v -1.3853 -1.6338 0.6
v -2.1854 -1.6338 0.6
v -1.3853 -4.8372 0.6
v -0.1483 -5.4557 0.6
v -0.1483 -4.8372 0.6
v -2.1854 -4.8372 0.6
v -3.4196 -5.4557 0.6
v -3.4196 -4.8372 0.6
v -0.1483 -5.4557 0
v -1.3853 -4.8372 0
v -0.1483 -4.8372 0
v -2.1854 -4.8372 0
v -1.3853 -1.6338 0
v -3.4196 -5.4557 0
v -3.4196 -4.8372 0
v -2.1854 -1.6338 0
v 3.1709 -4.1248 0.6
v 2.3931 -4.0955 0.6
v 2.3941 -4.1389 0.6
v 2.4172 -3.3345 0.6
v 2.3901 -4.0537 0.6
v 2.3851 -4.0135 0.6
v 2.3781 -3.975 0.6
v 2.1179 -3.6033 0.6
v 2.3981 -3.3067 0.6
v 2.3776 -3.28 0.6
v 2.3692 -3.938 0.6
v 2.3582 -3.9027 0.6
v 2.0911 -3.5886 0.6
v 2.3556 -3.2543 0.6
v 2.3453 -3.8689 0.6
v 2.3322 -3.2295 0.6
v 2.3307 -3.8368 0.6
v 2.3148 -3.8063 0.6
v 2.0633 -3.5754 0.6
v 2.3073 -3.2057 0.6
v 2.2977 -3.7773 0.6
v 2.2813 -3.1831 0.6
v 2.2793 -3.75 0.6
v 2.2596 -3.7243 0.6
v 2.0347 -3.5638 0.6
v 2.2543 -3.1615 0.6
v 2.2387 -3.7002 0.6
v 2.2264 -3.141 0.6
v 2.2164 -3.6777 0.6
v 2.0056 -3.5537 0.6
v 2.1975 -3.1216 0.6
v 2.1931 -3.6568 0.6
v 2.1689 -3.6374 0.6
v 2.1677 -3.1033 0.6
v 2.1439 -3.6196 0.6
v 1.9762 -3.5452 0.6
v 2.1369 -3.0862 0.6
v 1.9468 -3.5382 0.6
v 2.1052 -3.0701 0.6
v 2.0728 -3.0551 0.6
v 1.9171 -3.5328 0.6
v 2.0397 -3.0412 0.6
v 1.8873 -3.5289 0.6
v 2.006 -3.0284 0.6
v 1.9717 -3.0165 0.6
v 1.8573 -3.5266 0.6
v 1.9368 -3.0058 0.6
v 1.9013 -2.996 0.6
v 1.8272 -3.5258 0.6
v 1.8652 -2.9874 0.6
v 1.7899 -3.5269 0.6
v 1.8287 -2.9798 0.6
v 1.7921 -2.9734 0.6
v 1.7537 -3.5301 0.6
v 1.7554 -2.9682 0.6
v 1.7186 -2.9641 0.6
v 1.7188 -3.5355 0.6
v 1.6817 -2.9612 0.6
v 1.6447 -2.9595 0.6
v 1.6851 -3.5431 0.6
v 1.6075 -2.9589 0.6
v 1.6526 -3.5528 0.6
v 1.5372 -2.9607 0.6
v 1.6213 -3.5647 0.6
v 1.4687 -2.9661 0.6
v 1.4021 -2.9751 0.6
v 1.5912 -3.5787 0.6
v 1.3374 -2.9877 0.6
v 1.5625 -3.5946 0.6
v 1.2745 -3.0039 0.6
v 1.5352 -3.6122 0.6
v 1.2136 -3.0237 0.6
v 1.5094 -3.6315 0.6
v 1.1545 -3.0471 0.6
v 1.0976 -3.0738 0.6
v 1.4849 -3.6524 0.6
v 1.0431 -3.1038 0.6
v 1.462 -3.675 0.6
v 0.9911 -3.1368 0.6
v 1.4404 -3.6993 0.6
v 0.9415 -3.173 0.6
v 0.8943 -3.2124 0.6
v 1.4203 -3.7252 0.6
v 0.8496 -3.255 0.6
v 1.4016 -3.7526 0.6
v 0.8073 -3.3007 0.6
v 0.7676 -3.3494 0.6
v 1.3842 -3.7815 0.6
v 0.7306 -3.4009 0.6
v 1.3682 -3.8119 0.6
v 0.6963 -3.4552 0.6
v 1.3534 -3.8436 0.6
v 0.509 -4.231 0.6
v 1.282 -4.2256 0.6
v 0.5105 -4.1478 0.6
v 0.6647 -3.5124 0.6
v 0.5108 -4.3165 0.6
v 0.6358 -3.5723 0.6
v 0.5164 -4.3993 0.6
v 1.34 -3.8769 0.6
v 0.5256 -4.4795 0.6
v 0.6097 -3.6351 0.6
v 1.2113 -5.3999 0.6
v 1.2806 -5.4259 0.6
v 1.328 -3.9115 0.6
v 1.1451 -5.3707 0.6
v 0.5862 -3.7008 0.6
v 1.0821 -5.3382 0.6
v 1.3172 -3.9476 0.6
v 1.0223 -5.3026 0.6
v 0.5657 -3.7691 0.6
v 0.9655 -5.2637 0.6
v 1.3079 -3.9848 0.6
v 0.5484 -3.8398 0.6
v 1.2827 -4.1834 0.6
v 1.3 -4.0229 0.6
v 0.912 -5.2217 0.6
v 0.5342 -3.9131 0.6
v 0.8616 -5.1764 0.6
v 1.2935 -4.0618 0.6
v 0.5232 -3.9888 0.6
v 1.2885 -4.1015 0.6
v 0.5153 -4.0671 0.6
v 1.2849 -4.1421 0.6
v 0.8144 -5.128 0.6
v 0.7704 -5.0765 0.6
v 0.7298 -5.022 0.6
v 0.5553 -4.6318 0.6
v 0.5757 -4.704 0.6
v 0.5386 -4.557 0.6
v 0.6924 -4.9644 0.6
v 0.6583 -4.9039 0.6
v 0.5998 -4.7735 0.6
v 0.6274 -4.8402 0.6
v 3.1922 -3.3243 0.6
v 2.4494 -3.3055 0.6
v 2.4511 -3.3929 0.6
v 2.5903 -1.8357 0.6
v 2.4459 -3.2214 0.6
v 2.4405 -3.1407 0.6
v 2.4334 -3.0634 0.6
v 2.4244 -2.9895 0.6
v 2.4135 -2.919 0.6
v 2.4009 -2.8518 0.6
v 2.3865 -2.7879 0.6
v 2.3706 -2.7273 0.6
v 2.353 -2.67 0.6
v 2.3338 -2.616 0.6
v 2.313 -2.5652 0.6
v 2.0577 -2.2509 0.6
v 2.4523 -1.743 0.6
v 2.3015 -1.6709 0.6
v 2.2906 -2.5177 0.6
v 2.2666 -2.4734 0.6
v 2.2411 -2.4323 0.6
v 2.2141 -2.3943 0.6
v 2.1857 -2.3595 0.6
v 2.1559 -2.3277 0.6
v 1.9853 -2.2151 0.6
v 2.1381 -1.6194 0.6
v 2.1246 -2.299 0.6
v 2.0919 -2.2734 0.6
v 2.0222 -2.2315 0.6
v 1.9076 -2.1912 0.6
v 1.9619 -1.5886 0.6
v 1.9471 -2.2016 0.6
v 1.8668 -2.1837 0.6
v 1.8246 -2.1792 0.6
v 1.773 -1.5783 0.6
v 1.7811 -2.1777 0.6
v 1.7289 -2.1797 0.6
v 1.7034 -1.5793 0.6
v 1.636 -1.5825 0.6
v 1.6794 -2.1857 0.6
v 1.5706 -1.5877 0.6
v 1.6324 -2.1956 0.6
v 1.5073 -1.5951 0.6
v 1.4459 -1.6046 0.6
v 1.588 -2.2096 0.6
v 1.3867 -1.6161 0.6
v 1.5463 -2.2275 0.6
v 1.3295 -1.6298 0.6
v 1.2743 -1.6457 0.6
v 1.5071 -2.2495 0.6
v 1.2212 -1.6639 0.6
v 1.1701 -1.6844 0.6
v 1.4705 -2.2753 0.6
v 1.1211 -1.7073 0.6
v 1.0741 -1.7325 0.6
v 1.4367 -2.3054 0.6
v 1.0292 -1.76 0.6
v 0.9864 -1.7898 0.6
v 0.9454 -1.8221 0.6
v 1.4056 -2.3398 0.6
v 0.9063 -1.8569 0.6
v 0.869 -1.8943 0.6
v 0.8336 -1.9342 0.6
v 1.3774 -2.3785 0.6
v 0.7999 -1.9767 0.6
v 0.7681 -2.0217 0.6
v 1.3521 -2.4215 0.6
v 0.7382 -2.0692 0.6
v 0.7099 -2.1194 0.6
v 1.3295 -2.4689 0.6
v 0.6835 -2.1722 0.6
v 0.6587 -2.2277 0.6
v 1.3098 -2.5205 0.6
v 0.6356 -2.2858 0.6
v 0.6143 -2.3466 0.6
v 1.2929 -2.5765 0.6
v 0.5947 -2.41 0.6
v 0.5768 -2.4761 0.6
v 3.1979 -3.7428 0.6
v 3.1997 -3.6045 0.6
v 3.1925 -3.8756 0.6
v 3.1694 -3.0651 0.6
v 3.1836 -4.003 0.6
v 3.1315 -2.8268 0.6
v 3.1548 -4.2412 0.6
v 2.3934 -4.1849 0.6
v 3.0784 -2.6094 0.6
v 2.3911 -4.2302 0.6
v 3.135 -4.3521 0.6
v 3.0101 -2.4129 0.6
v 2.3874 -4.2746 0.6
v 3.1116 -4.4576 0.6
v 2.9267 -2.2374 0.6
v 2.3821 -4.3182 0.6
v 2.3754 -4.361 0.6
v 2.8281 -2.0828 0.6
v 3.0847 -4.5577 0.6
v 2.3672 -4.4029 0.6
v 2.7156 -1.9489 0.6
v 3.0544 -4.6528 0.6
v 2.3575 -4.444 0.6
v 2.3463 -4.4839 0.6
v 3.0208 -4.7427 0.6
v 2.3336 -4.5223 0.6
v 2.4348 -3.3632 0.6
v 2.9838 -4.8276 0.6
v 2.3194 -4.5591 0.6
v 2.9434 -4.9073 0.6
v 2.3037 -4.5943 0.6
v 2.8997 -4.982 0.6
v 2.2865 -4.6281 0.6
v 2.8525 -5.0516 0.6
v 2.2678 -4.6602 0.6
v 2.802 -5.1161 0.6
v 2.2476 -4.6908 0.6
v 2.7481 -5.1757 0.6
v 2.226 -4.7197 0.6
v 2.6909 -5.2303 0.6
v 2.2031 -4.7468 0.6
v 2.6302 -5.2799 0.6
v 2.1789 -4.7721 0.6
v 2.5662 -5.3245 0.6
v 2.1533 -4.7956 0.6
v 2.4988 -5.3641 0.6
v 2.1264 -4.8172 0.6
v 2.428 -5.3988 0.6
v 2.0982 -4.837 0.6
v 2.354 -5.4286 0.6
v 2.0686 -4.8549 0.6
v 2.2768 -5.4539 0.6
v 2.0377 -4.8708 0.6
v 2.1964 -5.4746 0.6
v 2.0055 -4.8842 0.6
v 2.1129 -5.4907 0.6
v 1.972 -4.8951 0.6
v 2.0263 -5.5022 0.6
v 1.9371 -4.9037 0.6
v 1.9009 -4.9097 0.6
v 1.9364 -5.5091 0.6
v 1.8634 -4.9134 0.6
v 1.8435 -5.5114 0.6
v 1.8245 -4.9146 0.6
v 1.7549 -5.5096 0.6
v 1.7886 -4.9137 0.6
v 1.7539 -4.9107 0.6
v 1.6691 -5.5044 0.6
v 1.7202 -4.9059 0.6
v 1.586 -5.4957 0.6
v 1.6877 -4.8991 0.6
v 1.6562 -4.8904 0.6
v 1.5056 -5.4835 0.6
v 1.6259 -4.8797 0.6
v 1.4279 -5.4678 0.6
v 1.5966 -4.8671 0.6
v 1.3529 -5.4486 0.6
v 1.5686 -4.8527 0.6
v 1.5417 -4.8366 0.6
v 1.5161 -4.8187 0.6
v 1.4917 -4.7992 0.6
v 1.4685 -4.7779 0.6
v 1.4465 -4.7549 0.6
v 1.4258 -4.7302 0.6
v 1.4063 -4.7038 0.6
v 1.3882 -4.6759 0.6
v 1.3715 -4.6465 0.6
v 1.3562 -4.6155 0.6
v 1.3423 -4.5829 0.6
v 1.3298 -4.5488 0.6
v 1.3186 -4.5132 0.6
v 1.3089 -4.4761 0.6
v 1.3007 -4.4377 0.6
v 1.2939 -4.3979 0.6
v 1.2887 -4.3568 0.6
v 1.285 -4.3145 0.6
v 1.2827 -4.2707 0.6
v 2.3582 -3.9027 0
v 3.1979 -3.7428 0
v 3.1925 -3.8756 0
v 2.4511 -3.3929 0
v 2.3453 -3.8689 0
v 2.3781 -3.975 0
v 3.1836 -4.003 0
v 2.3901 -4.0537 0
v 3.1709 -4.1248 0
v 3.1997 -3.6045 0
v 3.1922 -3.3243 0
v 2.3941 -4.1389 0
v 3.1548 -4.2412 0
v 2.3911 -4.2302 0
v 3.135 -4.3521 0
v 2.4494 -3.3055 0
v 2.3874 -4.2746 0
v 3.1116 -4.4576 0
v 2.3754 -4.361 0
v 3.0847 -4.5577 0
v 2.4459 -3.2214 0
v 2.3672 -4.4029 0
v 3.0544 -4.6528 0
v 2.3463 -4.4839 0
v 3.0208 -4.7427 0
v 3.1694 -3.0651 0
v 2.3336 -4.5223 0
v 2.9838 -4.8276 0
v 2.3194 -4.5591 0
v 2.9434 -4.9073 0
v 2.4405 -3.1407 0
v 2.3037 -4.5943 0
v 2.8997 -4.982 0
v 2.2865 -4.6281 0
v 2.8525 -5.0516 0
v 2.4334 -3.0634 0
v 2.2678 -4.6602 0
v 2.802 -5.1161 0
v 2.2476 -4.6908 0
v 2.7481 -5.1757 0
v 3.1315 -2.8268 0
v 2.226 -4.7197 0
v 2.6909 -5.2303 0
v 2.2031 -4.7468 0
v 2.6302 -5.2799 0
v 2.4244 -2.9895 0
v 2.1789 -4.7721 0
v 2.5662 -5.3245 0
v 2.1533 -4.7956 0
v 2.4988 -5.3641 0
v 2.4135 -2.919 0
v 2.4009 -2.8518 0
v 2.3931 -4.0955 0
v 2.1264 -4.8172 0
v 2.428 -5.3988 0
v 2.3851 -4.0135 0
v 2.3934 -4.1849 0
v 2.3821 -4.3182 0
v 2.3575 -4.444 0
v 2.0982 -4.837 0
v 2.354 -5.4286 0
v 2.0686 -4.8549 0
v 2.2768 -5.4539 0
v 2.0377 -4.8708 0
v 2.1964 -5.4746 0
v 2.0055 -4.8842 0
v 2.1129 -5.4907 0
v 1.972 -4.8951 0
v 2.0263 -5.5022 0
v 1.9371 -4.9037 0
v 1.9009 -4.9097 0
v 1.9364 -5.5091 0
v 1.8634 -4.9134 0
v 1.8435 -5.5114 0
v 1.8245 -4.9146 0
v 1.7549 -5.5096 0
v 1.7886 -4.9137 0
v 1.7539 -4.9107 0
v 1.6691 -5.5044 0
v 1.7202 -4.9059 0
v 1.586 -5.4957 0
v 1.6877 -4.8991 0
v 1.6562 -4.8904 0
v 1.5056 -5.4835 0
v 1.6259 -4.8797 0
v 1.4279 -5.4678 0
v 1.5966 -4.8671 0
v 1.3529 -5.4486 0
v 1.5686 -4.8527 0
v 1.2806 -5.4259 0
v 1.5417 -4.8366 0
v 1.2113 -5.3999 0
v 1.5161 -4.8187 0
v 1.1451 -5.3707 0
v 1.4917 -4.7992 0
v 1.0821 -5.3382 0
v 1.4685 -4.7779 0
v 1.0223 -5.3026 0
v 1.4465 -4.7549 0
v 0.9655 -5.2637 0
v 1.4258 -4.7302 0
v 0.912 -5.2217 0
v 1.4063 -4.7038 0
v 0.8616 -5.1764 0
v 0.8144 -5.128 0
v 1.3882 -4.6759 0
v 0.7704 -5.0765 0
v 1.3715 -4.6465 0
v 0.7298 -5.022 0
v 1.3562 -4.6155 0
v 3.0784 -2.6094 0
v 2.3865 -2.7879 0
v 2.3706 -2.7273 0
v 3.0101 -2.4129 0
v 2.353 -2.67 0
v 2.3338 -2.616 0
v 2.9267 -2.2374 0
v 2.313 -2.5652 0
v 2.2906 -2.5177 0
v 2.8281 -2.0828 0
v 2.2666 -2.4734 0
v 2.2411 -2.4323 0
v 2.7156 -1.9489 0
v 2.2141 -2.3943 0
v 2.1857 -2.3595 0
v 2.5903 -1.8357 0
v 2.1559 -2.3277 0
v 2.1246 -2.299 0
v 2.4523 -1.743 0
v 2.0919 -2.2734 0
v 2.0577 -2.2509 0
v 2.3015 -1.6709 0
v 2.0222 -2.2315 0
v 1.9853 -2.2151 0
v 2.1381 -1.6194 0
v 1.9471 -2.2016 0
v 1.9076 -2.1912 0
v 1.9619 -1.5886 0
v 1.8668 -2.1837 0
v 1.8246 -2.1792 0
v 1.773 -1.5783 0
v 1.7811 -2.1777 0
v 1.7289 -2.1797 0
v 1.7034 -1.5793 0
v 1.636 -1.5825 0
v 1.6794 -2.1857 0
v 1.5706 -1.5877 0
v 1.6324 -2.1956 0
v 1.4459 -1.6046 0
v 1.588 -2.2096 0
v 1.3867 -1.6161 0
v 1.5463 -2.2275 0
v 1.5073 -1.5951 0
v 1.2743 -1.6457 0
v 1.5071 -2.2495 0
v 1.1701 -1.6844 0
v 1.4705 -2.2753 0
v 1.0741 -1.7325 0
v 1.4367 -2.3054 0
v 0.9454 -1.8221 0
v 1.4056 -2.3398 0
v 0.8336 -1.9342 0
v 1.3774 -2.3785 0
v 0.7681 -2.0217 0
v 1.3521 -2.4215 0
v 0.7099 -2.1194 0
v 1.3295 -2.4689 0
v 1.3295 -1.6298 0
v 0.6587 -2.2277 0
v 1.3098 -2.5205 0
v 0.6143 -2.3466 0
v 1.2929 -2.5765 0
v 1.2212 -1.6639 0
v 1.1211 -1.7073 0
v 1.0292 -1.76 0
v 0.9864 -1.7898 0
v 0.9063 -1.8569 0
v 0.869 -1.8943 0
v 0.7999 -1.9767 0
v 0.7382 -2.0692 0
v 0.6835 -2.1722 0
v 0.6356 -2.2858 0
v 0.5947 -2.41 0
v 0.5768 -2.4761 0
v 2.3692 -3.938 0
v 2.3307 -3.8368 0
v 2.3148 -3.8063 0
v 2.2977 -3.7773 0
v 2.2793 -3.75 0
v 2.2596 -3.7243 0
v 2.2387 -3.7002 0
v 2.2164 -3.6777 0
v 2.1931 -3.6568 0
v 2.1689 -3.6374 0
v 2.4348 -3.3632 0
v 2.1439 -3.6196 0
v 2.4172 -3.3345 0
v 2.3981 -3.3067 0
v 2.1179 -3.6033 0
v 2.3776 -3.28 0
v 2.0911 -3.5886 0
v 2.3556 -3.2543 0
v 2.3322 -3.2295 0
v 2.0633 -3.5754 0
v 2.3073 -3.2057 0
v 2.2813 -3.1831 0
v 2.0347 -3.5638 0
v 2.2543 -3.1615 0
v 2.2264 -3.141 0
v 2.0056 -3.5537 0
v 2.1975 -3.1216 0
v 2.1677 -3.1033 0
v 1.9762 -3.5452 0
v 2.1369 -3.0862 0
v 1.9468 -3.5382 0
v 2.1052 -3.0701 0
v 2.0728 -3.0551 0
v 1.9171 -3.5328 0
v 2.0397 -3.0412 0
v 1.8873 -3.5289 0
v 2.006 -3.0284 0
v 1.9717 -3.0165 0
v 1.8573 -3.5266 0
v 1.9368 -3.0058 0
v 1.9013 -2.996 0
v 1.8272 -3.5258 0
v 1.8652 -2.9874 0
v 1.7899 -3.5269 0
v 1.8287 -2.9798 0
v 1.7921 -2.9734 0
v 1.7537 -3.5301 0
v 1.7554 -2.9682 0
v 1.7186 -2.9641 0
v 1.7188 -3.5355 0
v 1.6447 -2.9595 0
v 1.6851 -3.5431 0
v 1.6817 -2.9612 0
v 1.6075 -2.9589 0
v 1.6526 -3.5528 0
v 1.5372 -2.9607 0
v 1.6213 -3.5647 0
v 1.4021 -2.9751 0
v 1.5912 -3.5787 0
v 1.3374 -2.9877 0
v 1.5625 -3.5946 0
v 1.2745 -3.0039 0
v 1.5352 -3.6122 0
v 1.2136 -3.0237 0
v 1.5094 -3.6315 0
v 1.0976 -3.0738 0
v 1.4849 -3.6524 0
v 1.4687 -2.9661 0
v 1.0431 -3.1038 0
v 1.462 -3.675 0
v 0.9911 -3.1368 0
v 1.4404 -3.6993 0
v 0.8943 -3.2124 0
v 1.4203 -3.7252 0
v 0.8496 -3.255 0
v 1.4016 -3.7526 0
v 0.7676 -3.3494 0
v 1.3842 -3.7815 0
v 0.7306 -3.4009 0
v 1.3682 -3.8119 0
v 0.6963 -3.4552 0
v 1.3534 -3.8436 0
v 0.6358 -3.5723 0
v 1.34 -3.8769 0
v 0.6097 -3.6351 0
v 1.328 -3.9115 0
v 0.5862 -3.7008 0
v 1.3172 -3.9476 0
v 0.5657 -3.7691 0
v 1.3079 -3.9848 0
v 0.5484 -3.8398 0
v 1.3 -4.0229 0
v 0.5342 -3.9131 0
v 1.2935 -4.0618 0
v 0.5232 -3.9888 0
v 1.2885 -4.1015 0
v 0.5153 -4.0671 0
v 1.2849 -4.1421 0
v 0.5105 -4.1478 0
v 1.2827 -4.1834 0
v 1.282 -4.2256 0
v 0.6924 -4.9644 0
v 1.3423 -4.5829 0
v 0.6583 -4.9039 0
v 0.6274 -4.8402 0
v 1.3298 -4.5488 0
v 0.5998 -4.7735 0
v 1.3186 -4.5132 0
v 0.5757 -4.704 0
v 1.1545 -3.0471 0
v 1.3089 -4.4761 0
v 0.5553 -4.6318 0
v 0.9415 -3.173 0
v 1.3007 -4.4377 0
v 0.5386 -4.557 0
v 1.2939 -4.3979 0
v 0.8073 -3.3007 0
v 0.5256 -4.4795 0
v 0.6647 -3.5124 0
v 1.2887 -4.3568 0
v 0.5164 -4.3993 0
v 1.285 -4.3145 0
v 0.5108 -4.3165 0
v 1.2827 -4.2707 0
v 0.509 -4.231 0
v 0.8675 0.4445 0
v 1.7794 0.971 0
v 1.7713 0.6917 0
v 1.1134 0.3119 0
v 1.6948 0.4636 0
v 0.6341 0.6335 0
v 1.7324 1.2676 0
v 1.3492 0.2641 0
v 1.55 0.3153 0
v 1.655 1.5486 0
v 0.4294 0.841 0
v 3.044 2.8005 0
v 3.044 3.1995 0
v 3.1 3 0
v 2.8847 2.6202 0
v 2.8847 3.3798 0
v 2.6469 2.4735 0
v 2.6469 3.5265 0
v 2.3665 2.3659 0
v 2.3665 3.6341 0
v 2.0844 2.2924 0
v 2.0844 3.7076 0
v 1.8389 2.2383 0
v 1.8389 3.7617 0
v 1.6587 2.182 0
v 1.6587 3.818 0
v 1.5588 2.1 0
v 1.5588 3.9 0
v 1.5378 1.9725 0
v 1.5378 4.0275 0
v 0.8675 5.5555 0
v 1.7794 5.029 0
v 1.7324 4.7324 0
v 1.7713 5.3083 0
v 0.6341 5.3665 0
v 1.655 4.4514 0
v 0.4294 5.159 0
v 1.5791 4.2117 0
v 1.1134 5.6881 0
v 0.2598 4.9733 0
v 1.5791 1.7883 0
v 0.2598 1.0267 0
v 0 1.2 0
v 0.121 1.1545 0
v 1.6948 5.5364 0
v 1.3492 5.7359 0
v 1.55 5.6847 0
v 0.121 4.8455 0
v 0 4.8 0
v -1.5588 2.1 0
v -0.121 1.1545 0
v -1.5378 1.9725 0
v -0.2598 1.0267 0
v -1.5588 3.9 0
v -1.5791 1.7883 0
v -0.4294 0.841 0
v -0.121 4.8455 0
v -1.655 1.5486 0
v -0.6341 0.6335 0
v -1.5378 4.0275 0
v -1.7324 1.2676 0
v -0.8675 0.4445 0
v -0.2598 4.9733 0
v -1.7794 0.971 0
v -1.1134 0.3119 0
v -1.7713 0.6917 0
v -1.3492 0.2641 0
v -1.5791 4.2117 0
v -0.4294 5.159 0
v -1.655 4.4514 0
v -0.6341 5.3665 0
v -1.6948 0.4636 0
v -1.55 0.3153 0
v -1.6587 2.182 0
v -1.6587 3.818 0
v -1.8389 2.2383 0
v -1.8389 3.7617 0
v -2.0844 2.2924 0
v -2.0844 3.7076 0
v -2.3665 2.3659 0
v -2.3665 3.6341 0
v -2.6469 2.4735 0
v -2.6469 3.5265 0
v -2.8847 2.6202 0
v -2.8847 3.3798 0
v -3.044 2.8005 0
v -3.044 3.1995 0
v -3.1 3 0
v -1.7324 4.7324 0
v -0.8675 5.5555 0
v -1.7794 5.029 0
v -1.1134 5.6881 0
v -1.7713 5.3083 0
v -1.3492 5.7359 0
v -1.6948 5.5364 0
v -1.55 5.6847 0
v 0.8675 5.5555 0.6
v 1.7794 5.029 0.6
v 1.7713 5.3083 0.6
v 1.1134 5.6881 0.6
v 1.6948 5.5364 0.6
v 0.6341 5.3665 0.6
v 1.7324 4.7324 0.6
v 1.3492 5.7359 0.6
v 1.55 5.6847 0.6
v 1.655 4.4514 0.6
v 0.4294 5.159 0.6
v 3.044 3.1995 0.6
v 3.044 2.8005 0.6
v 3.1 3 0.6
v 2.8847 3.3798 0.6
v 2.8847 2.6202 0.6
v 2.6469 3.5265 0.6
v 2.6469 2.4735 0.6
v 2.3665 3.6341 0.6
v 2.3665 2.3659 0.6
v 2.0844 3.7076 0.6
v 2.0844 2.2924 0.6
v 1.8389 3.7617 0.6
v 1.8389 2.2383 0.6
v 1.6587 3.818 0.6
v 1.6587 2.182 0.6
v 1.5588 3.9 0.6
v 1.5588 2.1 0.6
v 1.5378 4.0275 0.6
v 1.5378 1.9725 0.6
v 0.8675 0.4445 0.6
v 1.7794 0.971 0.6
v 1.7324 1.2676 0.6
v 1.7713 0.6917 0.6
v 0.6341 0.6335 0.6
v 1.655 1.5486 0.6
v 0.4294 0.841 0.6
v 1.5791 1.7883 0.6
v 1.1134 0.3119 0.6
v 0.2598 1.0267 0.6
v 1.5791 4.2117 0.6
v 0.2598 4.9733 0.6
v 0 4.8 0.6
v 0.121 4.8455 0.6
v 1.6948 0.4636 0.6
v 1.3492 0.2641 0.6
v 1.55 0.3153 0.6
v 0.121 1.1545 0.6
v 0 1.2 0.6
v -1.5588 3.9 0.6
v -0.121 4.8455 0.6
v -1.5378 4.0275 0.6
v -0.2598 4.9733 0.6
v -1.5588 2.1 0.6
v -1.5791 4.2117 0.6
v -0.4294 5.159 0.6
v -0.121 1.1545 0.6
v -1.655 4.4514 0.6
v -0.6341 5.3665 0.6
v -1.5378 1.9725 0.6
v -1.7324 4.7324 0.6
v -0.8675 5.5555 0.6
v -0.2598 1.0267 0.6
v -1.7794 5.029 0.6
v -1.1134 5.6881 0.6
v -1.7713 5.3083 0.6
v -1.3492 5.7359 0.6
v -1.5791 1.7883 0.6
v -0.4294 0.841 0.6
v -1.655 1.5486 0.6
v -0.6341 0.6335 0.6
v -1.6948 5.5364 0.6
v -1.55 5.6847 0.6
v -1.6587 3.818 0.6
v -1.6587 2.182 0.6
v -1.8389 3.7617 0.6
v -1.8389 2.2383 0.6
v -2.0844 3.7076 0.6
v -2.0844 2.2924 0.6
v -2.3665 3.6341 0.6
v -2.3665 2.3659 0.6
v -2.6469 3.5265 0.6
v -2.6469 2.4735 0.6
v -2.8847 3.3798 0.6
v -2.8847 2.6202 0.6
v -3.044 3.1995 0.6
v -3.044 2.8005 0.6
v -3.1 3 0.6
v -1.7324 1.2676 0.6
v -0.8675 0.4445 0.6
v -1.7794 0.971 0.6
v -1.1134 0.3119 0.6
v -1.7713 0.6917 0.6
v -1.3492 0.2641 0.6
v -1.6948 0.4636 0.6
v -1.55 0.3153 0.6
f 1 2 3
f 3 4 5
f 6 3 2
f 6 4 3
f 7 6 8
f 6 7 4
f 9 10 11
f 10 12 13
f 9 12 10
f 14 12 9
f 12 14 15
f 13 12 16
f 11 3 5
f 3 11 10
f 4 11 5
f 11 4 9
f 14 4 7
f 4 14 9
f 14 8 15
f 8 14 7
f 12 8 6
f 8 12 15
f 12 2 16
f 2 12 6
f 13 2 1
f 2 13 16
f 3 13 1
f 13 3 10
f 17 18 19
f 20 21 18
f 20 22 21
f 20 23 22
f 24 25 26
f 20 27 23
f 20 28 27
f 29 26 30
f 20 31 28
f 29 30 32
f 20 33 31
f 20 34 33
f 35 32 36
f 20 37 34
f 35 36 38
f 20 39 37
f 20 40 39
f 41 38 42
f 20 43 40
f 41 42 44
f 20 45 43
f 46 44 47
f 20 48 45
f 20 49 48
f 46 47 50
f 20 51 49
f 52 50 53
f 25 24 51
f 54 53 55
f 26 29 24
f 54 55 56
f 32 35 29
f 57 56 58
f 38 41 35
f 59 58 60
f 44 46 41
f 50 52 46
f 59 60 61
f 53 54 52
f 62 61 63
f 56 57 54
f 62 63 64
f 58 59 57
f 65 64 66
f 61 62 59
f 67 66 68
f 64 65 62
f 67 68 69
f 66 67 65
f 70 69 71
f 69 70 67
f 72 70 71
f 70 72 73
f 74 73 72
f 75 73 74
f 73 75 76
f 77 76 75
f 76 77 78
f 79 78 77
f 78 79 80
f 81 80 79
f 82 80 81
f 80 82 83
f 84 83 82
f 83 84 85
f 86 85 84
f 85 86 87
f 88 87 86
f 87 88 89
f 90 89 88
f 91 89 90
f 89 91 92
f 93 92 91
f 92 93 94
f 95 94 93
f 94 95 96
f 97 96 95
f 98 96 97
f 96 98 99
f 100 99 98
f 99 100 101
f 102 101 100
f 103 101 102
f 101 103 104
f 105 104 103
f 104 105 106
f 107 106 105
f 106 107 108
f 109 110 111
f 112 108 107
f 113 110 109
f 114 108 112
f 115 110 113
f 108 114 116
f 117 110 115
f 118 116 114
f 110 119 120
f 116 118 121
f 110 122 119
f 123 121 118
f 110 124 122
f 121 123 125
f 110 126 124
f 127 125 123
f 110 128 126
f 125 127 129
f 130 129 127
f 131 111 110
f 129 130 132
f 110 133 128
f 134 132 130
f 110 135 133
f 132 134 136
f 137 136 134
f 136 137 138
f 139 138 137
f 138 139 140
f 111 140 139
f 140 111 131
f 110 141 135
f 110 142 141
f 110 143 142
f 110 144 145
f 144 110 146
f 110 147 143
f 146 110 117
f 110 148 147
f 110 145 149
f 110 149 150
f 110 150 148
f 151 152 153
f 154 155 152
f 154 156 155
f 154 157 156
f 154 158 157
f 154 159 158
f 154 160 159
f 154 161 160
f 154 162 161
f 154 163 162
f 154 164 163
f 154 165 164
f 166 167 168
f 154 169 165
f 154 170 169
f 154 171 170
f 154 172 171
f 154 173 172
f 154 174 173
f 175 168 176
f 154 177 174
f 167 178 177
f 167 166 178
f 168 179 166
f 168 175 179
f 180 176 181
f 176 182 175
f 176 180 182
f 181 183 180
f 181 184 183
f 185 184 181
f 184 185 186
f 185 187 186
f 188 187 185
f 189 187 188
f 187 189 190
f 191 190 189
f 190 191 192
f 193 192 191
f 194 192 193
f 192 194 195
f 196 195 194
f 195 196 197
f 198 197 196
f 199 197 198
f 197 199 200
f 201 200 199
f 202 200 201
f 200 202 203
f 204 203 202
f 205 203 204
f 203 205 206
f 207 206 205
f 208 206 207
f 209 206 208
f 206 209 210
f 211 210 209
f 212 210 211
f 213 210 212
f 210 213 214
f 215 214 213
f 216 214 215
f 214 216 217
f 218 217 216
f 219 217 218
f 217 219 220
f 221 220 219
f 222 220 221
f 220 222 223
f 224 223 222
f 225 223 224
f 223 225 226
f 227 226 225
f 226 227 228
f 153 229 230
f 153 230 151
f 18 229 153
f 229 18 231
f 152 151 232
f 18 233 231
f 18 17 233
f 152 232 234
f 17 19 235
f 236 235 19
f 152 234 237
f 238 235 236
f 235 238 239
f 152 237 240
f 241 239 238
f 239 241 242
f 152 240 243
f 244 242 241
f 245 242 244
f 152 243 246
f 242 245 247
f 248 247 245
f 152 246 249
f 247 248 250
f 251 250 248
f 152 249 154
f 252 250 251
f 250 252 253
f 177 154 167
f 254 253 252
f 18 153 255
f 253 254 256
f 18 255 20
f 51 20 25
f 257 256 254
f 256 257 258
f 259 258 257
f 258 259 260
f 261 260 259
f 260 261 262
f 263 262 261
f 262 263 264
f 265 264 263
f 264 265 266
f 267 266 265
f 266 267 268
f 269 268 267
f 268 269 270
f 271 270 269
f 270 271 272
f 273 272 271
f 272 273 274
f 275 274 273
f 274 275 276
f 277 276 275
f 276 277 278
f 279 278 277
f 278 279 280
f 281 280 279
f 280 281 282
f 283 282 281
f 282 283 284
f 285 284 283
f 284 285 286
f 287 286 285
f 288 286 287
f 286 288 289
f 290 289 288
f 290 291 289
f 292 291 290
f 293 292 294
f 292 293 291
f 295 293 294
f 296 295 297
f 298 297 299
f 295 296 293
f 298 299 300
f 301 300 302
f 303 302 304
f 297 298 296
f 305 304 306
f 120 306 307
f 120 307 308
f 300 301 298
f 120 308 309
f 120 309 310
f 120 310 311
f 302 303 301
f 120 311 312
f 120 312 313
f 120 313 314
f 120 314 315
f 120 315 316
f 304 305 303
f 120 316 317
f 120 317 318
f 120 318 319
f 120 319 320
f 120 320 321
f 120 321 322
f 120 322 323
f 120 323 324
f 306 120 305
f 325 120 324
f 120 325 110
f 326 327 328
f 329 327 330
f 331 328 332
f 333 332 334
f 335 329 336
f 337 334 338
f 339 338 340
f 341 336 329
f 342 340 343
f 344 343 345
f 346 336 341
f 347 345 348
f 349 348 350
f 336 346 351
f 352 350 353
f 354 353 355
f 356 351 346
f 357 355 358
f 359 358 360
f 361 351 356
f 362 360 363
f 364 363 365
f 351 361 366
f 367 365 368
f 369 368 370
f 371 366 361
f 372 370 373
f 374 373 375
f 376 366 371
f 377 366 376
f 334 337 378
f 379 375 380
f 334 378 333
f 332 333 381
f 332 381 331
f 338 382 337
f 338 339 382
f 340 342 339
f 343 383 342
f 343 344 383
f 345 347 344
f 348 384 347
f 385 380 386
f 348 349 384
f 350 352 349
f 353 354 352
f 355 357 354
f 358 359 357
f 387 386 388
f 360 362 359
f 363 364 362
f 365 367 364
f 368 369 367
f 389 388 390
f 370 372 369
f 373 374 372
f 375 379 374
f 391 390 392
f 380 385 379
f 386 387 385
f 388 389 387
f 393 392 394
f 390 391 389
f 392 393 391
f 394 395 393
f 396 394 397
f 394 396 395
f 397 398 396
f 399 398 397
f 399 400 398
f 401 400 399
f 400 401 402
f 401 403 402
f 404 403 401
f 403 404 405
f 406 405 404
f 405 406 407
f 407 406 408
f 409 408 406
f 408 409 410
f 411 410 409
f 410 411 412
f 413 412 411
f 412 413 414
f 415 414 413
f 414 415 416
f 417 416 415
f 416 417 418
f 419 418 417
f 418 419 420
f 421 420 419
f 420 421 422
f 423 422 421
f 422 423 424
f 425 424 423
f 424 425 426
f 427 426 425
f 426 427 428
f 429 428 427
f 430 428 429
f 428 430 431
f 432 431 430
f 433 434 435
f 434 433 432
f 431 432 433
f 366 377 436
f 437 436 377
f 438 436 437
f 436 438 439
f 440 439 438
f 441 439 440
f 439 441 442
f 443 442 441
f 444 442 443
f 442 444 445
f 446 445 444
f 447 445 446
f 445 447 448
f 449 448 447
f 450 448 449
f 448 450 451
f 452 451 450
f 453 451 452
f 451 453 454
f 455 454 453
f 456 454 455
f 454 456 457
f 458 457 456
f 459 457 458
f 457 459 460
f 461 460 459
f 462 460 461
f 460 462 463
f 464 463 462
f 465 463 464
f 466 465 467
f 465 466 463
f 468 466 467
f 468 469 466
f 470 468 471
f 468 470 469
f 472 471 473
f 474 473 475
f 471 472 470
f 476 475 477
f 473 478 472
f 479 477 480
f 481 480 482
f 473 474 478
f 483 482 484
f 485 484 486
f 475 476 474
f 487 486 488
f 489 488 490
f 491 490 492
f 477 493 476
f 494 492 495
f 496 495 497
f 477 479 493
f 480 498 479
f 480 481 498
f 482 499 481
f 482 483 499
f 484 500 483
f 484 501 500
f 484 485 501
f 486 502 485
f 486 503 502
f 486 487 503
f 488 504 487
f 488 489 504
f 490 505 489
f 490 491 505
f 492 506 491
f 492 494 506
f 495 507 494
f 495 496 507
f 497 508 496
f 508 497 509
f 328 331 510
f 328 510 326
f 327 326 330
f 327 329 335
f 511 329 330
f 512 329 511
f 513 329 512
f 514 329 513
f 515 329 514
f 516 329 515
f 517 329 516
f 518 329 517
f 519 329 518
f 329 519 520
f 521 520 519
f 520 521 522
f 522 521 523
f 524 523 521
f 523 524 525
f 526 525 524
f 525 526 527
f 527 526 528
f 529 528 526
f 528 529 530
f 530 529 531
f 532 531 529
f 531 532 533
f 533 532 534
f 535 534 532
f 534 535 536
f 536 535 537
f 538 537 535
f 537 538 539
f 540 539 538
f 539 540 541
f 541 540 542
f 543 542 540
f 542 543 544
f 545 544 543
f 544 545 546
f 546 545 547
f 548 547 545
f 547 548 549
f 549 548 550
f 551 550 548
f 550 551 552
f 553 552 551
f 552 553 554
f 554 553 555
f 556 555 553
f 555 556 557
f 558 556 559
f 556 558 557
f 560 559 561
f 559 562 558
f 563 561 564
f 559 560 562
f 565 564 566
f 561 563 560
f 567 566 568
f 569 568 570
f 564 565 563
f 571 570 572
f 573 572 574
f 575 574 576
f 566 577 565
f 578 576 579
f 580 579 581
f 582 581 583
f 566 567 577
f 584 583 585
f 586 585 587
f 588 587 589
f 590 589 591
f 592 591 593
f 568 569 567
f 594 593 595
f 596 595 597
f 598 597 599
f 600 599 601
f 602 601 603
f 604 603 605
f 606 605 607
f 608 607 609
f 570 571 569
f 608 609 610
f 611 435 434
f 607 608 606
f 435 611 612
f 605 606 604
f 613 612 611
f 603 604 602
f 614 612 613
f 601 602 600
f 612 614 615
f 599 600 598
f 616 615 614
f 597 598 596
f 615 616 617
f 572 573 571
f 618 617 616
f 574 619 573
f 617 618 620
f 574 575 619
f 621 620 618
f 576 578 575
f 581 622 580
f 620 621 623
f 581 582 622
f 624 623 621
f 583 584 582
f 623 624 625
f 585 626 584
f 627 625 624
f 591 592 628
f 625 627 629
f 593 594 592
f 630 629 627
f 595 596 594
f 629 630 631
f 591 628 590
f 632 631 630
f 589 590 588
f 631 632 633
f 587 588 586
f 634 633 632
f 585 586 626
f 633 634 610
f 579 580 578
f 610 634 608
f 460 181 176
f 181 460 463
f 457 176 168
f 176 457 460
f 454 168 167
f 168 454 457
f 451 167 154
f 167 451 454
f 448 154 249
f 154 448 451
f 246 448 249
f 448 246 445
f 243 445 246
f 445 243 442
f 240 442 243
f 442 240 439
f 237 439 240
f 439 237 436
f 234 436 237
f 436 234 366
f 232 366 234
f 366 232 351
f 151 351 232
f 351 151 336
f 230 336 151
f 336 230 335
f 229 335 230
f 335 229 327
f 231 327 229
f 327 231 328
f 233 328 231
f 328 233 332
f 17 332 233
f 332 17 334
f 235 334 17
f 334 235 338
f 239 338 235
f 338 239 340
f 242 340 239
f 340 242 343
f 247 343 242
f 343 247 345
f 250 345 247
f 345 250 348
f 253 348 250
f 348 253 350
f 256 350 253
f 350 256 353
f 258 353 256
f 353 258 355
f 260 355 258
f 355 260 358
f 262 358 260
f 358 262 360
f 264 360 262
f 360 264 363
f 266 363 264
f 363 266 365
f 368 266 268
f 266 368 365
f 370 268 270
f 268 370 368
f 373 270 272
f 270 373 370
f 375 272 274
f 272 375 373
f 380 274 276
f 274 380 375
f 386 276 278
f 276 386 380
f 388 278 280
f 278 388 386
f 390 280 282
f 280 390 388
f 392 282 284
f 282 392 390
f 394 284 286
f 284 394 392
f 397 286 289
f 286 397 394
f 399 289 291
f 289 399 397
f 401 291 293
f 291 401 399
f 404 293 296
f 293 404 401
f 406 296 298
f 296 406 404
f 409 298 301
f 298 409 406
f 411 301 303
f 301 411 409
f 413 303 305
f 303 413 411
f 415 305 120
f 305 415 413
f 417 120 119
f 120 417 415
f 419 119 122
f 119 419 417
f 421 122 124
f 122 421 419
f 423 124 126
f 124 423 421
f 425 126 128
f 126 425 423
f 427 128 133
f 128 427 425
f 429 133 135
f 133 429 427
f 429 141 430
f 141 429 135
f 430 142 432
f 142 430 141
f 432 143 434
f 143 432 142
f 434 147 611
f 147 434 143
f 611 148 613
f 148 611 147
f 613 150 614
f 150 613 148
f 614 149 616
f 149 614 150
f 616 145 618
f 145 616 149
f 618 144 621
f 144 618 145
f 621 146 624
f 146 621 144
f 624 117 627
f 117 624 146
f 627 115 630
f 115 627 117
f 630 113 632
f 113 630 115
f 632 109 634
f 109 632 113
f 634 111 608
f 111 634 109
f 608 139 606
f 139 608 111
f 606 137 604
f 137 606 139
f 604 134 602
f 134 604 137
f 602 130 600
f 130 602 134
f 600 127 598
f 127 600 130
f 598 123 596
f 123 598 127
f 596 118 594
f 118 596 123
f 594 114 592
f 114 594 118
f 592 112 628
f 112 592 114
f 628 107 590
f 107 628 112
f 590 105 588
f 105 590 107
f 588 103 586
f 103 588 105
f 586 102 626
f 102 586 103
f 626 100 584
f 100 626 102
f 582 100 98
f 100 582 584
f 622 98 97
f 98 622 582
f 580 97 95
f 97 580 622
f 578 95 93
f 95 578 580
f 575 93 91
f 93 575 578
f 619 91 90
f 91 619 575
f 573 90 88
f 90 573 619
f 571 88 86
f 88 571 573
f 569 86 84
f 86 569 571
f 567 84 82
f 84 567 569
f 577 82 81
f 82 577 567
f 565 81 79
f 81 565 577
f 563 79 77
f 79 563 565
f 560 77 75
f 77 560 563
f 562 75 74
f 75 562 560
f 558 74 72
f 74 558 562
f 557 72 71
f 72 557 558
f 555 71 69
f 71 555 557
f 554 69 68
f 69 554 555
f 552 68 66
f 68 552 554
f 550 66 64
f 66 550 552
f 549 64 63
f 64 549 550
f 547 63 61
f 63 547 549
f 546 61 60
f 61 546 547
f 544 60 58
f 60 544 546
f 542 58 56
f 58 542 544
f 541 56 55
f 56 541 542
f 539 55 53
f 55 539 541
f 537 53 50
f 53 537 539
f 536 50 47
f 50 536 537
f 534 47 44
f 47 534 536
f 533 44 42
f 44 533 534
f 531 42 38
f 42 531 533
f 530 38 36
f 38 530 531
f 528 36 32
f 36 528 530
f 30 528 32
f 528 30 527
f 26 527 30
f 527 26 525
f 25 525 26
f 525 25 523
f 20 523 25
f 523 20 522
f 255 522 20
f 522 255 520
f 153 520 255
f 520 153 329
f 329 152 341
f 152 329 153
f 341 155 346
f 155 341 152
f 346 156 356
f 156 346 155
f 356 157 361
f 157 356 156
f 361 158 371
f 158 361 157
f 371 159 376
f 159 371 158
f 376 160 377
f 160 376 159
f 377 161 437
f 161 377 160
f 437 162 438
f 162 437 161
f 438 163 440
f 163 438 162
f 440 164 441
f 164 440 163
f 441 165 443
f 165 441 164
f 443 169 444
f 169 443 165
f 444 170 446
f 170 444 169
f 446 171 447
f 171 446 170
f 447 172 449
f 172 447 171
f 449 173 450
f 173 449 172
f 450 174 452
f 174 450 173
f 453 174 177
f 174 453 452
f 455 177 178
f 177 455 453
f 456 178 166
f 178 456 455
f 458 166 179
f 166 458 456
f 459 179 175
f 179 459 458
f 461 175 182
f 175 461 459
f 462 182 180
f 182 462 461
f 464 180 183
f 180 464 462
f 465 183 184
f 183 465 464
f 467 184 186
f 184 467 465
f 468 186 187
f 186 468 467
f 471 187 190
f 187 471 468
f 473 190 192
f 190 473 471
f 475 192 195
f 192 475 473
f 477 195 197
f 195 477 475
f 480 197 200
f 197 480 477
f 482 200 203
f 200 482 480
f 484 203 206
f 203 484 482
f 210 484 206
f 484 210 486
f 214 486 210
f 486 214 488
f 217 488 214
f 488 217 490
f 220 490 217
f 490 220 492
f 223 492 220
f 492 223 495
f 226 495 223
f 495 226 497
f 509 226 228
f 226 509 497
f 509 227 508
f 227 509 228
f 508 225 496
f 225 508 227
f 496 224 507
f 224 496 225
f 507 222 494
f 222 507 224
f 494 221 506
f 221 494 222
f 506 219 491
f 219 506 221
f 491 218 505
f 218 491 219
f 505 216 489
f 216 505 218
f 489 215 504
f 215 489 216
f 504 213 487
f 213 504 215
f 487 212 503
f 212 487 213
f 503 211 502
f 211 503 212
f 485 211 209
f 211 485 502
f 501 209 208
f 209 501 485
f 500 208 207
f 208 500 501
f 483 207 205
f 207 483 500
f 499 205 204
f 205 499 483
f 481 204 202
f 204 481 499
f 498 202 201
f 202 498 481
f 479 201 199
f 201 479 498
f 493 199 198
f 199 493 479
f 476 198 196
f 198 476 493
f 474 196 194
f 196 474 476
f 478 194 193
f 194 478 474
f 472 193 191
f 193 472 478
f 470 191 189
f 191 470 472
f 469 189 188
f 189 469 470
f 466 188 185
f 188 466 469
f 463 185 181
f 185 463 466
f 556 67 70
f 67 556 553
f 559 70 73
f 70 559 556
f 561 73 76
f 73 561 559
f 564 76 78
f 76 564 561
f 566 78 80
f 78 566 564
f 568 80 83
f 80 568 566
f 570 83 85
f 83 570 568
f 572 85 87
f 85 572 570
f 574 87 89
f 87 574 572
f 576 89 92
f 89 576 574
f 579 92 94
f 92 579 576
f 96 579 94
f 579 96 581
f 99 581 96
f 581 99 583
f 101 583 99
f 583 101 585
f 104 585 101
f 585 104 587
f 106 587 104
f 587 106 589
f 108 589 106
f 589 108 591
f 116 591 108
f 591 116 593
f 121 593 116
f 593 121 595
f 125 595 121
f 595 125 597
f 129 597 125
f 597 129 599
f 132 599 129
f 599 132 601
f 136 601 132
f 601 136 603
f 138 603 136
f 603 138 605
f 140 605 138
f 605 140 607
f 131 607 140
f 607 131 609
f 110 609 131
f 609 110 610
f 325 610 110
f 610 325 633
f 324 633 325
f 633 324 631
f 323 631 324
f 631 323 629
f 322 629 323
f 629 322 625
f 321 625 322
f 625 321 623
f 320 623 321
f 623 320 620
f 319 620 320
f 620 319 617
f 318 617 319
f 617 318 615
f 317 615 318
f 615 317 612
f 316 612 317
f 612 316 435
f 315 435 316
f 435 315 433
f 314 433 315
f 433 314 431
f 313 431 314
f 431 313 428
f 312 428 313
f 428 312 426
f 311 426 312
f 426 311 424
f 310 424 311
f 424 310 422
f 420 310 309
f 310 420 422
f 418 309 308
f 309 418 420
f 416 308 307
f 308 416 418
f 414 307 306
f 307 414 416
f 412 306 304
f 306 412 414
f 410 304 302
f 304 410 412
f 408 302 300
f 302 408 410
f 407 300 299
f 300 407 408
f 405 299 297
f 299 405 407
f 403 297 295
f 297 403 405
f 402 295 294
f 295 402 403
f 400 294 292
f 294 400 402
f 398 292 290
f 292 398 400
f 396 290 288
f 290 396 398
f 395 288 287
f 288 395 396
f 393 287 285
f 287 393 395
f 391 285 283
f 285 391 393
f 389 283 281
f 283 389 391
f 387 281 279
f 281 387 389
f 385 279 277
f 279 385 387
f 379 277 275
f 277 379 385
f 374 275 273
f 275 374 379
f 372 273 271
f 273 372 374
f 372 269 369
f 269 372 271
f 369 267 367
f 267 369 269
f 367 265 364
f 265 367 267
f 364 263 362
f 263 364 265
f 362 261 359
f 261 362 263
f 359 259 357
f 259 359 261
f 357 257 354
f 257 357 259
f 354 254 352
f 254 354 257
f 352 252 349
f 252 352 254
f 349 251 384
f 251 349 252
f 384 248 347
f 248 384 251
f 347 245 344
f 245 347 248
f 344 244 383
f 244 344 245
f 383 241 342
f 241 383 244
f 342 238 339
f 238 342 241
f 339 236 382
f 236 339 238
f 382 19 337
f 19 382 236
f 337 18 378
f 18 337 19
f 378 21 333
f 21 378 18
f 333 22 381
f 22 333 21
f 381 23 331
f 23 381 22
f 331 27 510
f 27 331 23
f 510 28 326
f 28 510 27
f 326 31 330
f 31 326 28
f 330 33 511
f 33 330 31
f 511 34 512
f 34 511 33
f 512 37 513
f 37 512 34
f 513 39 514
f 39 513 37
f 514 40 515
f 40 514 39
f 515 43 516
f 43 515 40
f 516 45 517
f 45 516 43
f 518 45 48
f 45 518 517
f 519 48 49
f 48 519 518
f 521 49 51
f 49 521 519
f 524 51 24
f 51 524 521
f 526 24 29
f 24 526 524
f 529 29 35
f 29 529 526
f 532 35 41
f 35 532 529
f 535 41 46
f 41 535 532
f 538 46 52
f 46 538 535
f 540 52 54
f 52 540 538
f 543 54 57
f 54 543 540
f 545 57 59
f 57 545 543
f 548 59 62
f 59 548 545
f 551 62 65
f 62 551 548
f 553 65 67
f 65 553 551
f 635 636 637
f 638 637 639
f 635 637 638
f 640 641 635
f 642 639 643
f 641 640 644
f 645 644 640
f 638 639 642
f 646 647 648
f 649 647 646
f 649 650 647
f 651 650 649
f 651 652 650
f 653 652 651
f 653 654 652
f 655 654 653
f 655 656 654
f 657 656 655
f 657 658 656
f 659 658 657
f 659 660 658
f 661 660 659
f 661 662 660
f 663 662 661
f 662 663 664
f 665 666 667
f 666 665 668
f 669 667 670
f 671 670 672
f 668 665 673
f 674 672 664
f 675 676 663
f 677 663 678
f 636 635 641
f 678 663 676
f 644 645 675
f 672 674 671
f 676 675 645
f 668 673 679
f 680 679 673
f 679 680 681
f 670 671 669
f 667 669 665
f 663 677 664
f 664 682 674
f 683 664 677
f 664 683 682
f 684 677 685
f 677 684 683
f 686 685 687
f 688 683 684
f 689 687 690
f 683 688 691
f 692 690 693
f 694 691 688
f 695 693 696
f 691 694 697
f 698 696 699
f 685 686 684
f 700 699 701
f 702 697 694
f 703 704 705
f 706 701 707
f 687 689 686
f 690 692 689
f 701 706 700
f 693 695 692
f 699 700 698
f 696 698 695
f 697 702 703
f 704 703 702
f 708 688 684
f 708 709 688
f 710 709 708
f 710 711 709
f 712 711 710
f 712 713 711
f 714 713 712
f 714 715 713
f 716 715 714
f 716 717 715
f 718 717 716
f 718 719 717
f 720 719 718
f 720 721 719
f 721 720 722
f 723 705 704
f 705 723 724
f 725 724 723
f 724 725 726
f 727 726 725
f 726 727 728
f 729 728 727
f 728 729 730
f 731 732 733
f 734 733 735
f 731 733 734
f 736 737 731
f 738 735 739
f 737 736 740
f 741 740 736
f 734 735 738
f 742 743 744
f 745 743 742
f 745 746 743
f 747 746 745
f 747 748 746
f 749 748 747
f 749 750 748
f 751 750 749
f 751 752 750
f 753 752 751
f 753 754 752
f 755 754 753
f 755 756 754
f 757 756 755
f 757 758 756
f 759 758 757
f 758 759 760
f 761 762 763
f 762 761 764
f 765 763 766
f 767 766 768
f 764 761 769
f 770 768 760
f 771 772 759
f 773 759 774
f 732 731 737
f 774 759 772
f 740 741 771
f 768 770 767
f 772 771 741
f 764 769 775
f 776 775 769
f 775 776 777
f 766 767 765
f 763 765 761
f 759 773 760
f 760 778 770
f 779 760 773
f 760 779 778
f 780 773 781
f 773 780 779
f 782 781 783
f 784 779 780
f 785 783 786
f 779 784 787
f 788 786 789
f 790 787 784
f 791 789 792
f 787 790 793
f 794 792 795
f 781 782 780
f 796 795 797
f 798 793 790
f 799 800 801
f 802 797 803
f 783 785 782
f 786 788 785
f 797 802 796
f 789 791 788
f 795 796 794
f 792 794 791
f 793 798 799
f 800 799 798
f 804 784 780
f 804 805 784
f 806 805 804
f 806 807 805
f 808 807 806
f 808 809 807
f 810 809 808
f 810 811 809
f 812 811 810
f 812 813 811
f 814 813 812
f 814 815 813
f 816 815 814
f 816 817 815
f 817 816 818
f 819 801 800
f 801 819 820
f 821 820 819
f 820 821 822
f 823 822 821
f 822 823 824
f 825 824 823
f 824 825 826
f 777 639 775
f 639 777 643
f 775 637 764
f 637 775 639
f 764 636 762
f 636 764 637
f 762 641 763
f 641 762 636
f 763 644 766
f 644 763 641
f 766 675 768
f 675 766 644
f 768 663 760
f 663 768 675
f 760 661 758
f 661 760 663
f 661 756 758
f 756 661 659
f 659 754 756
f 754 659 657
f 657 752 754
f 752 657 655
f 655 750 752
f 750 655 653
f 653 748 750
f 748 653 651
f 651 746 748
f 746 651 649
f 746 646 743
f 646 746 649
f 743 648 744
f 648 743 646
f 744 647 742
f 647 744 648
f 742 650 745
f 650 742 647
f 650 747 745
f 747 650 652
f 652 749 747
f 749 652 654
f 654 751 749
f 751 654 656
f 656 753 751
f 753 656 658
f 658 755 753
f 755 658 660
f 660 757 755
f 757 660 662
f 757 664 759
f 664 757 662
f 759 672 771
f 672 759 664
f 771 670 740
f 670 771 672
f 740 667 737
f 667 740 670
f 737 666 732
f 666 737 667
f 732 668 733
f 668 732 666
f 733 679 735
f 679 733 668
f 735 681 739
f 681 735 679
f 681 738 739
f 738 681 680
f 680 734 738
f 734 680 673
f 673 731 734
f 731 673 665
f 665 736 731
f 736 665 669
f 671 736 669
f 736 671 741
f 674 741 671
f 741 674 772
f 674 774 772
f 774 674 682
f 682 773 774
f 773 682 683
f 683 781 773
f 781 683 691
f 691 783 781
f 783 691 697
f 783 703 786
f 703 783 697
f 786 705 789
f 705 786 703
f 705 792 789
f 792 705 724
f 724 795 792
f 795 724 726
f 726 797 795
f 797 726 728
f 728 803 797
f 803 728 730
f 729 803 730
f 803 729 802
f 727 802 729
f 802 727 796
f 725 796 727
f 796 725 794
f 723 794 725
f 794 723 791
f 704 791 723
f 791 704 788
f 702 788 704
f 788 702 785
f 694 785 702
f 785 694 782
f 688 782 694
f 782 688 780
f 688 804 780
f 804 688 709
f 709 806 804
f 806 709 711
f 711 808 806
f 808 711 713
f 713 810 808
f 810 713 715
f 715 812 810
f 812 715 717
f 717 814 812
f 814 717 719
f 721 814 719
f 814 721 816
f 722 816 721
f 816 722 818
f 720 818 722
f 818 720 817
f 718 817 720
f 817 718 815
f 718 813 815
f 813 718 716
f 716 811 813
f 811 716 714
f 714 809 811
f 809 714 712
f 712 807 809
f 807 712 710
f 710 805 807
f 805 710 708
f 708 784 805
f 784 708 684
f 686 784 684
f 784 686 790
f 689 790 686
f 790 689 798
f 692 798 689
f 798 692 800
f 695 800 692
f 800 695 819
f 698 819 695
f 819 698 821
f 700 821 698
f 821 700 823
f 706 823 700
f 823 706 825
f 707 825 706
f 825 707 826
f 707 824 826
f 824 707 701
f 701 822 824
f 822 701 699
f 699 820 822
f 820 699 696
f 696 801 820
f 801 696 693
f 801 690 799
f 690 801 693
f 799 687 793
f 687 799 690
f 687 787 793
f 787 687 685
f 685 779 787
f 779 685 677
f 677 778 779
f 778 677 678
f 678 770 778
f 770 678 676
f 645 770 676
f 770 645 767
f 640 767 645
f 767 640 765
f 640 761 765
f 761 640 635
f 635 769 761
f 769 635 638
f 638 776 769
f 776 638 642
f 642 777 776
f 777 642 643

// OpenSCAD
$fn = 50;

difference() {
	union() {
		translate(v = [-1.825, -3.5, 0.6]) {
			rotate(a = [180, 0, 0]) {
				linear_extrude(height = 0.6) {
					text(font = "Liberation Sans:style=Bold", halign = "center", size = 4.0, text = "T", valign = "center");
				}
			}
		}
		translate(v = [1.825, -3.5, 0.6]) {
			rotate(a = [180, 0, 0]) {
				linear_extrude(height = 0.6) {
					text(font = "Liberation Sans:style=Bold", halign = "center", size = 4.0, text = "9", valign = "center");
				}
			}
		}
		translate(v = [0, 3, 0]) {
			linear_extrude(height = 0.6) {
				polygon(points = [[3.1, 0.0], [3.0439902950186117, 0.1995136647114984], [2.8847272103883213, 0.3797815421059436], [2.646888617374527, 0.5264988810722369], [2.3665182744082176, 0.6341066605011758], [2.0844354103556904, 0.7075704773708675], [1.8388718910678303, 0.761685676746956], [1.658746676795018, 0.818003336606089], [1.55884572681199, 0.9], [1.5377850082788151, 1.0275150922444565], [1.5790750912955211, 1.211666933596394], [1.6549917135488983, 1.4513887792304347], [1.7324116139070416, 1.7324116139070416], [1.779405714759903, 2.0290233430980913], [1.7712640685463372, 2.3083562761315313], [1.6947790495515949, 2.5364160920036563], [1.5500000000000005, 2.68467875173176], [1.3492112454670173, 2.735929756715155], [1.1134631418419842, 2.688137818237475], [0.8674829026146248, 2.555522224170328], [0.6341066605011758, 2.3665182744082176], [0.42944369680679173, 2.1589592566013023], [0.2597967997723095, 1.9733526103433505], [0.120961668516203, 1.8455184288505457], [1.102182119232618e-16, 1.8000000000000003], [-0.12096166851620277, 1.8455184288505457], [-0.25979679977230924, 1.9733526103433503], [-0.42944369680679134, 2.158959256601302], [-0.6341066605011755, 2.366518274408217], [-0.8674829026146244, 2.555522224170328], [-1.1134631418419831, 2.688137818237475], [-1.3492112454670169, 2.735929756715155], [-1.5499999999999994, 2.68467875173176], [-1.6947790495515944, 2.536416092003656], [-1.7712640685463372, 2.3083562761315313], [-1.7794057147599032, 2.0290233430980913], [-1.7324116139070418, 1.732411613907042], [-1.6549917135488983, 1.4513887792304352], [-1.5790750912955214, 1.211666933596395], [-1.5377850082788156, 1.0275150922444576], [-1.55884572681199, 0.9], [-1.6587466767950174, 0.8180033366060897], [-1.8388718910678303, 0.7616856767469562], [-2.084435410355689, 0.7075704773708675], [-2.3665182744082154, 0.634106660501176], [-2.646888617374527, 0.5264988810722366], [-2.8847272103883204, 0.37978154210594467], [-3.0439902950186117, 0.1995136647114986], [-3.1, 3.796405077356795e-16], [-3.043990295018612, -0.19951366471149784], [-2.8847272103883213, -0.37978154210594417], [-2.646888617374528, -0.5264988810722362], [-2.366518274408217, -0.6341066605011759], [-2.0844354103556904, -0.7075704773708673], [-1.8388718910678312, -0.7616856767469561], [-1.6587466767950179, -0.8180033366060894], [-1.5588457268119902, -0.8999999999999996], [-1.5377850082788154, -1.0275150922444558], [-1.5790750912955211, -1.211666933596394], [-1.6549917135488978, -1.4513887792304343], [-1.7324116139070413, -1.7324116139070393], [-1.7794057147599032, -2.0290233430980904], [-1.7712640685463374, -2.30835627613153], [-1.6947790495515942, -2.5364160920036567], [-1.5500000000000014, -2.6846787517317594], [-1.349211245467018, -2.7359297567151555], [-1.1134631418419827, -2.688137818237474], [-0.8674829026146252, -2.5555222241703284], [-0.6341066605011755, -2.366518274408217], [-0.42944369680679256, -2.1589592566013027], [-0.2597967997723094, -1.973352610343351], [-0.12096166851620195, -1.8455184288505448], [-3.3065463576978537e-16, -1.8000000000000003], [0.12096166851620122, -1.8455184288505442], [0.2597967997723086, -1.9733526103433503], [0.4294436968067915, -2.1589592566013014], [0.6341066605011743, -2.3665182744082163], [0.8674829026146239, -2.5555222241703275], [1.1134631418419814, -2.688137818237473], [1.3492112454670167, -2.735929756715155], [1.5500000000000005, -2.68467875173176], [1.6947790495515938, -2.536416092003658], [1.7712640685463361, -2.3083562761315344], [1.7794057147599027, -2.0290233430980895], [1.732411613907041, -1.7324116139070416], [1.6549917135488992, -1.451388779230435], [1.5790750912955214, -1.2116669335963952], [1.5377850082788151, -1.0275150922444585], [1.5588457268119893, -0.9000000000000009], [1.658746676795018, -0.8180033366060894], [1.8388718910678303, -0.7616856767469555], [2.084435410355689, -0.7075704773708676], [2.366518274408215, -0.6341066605011774], [2.646888617374524, -0.5264988810722376], [2.8847272103883217, -0.37978154210594395], [3.0439902950186117, -0.1995136647114976]]);
			}
		}
	}
	union();
}
